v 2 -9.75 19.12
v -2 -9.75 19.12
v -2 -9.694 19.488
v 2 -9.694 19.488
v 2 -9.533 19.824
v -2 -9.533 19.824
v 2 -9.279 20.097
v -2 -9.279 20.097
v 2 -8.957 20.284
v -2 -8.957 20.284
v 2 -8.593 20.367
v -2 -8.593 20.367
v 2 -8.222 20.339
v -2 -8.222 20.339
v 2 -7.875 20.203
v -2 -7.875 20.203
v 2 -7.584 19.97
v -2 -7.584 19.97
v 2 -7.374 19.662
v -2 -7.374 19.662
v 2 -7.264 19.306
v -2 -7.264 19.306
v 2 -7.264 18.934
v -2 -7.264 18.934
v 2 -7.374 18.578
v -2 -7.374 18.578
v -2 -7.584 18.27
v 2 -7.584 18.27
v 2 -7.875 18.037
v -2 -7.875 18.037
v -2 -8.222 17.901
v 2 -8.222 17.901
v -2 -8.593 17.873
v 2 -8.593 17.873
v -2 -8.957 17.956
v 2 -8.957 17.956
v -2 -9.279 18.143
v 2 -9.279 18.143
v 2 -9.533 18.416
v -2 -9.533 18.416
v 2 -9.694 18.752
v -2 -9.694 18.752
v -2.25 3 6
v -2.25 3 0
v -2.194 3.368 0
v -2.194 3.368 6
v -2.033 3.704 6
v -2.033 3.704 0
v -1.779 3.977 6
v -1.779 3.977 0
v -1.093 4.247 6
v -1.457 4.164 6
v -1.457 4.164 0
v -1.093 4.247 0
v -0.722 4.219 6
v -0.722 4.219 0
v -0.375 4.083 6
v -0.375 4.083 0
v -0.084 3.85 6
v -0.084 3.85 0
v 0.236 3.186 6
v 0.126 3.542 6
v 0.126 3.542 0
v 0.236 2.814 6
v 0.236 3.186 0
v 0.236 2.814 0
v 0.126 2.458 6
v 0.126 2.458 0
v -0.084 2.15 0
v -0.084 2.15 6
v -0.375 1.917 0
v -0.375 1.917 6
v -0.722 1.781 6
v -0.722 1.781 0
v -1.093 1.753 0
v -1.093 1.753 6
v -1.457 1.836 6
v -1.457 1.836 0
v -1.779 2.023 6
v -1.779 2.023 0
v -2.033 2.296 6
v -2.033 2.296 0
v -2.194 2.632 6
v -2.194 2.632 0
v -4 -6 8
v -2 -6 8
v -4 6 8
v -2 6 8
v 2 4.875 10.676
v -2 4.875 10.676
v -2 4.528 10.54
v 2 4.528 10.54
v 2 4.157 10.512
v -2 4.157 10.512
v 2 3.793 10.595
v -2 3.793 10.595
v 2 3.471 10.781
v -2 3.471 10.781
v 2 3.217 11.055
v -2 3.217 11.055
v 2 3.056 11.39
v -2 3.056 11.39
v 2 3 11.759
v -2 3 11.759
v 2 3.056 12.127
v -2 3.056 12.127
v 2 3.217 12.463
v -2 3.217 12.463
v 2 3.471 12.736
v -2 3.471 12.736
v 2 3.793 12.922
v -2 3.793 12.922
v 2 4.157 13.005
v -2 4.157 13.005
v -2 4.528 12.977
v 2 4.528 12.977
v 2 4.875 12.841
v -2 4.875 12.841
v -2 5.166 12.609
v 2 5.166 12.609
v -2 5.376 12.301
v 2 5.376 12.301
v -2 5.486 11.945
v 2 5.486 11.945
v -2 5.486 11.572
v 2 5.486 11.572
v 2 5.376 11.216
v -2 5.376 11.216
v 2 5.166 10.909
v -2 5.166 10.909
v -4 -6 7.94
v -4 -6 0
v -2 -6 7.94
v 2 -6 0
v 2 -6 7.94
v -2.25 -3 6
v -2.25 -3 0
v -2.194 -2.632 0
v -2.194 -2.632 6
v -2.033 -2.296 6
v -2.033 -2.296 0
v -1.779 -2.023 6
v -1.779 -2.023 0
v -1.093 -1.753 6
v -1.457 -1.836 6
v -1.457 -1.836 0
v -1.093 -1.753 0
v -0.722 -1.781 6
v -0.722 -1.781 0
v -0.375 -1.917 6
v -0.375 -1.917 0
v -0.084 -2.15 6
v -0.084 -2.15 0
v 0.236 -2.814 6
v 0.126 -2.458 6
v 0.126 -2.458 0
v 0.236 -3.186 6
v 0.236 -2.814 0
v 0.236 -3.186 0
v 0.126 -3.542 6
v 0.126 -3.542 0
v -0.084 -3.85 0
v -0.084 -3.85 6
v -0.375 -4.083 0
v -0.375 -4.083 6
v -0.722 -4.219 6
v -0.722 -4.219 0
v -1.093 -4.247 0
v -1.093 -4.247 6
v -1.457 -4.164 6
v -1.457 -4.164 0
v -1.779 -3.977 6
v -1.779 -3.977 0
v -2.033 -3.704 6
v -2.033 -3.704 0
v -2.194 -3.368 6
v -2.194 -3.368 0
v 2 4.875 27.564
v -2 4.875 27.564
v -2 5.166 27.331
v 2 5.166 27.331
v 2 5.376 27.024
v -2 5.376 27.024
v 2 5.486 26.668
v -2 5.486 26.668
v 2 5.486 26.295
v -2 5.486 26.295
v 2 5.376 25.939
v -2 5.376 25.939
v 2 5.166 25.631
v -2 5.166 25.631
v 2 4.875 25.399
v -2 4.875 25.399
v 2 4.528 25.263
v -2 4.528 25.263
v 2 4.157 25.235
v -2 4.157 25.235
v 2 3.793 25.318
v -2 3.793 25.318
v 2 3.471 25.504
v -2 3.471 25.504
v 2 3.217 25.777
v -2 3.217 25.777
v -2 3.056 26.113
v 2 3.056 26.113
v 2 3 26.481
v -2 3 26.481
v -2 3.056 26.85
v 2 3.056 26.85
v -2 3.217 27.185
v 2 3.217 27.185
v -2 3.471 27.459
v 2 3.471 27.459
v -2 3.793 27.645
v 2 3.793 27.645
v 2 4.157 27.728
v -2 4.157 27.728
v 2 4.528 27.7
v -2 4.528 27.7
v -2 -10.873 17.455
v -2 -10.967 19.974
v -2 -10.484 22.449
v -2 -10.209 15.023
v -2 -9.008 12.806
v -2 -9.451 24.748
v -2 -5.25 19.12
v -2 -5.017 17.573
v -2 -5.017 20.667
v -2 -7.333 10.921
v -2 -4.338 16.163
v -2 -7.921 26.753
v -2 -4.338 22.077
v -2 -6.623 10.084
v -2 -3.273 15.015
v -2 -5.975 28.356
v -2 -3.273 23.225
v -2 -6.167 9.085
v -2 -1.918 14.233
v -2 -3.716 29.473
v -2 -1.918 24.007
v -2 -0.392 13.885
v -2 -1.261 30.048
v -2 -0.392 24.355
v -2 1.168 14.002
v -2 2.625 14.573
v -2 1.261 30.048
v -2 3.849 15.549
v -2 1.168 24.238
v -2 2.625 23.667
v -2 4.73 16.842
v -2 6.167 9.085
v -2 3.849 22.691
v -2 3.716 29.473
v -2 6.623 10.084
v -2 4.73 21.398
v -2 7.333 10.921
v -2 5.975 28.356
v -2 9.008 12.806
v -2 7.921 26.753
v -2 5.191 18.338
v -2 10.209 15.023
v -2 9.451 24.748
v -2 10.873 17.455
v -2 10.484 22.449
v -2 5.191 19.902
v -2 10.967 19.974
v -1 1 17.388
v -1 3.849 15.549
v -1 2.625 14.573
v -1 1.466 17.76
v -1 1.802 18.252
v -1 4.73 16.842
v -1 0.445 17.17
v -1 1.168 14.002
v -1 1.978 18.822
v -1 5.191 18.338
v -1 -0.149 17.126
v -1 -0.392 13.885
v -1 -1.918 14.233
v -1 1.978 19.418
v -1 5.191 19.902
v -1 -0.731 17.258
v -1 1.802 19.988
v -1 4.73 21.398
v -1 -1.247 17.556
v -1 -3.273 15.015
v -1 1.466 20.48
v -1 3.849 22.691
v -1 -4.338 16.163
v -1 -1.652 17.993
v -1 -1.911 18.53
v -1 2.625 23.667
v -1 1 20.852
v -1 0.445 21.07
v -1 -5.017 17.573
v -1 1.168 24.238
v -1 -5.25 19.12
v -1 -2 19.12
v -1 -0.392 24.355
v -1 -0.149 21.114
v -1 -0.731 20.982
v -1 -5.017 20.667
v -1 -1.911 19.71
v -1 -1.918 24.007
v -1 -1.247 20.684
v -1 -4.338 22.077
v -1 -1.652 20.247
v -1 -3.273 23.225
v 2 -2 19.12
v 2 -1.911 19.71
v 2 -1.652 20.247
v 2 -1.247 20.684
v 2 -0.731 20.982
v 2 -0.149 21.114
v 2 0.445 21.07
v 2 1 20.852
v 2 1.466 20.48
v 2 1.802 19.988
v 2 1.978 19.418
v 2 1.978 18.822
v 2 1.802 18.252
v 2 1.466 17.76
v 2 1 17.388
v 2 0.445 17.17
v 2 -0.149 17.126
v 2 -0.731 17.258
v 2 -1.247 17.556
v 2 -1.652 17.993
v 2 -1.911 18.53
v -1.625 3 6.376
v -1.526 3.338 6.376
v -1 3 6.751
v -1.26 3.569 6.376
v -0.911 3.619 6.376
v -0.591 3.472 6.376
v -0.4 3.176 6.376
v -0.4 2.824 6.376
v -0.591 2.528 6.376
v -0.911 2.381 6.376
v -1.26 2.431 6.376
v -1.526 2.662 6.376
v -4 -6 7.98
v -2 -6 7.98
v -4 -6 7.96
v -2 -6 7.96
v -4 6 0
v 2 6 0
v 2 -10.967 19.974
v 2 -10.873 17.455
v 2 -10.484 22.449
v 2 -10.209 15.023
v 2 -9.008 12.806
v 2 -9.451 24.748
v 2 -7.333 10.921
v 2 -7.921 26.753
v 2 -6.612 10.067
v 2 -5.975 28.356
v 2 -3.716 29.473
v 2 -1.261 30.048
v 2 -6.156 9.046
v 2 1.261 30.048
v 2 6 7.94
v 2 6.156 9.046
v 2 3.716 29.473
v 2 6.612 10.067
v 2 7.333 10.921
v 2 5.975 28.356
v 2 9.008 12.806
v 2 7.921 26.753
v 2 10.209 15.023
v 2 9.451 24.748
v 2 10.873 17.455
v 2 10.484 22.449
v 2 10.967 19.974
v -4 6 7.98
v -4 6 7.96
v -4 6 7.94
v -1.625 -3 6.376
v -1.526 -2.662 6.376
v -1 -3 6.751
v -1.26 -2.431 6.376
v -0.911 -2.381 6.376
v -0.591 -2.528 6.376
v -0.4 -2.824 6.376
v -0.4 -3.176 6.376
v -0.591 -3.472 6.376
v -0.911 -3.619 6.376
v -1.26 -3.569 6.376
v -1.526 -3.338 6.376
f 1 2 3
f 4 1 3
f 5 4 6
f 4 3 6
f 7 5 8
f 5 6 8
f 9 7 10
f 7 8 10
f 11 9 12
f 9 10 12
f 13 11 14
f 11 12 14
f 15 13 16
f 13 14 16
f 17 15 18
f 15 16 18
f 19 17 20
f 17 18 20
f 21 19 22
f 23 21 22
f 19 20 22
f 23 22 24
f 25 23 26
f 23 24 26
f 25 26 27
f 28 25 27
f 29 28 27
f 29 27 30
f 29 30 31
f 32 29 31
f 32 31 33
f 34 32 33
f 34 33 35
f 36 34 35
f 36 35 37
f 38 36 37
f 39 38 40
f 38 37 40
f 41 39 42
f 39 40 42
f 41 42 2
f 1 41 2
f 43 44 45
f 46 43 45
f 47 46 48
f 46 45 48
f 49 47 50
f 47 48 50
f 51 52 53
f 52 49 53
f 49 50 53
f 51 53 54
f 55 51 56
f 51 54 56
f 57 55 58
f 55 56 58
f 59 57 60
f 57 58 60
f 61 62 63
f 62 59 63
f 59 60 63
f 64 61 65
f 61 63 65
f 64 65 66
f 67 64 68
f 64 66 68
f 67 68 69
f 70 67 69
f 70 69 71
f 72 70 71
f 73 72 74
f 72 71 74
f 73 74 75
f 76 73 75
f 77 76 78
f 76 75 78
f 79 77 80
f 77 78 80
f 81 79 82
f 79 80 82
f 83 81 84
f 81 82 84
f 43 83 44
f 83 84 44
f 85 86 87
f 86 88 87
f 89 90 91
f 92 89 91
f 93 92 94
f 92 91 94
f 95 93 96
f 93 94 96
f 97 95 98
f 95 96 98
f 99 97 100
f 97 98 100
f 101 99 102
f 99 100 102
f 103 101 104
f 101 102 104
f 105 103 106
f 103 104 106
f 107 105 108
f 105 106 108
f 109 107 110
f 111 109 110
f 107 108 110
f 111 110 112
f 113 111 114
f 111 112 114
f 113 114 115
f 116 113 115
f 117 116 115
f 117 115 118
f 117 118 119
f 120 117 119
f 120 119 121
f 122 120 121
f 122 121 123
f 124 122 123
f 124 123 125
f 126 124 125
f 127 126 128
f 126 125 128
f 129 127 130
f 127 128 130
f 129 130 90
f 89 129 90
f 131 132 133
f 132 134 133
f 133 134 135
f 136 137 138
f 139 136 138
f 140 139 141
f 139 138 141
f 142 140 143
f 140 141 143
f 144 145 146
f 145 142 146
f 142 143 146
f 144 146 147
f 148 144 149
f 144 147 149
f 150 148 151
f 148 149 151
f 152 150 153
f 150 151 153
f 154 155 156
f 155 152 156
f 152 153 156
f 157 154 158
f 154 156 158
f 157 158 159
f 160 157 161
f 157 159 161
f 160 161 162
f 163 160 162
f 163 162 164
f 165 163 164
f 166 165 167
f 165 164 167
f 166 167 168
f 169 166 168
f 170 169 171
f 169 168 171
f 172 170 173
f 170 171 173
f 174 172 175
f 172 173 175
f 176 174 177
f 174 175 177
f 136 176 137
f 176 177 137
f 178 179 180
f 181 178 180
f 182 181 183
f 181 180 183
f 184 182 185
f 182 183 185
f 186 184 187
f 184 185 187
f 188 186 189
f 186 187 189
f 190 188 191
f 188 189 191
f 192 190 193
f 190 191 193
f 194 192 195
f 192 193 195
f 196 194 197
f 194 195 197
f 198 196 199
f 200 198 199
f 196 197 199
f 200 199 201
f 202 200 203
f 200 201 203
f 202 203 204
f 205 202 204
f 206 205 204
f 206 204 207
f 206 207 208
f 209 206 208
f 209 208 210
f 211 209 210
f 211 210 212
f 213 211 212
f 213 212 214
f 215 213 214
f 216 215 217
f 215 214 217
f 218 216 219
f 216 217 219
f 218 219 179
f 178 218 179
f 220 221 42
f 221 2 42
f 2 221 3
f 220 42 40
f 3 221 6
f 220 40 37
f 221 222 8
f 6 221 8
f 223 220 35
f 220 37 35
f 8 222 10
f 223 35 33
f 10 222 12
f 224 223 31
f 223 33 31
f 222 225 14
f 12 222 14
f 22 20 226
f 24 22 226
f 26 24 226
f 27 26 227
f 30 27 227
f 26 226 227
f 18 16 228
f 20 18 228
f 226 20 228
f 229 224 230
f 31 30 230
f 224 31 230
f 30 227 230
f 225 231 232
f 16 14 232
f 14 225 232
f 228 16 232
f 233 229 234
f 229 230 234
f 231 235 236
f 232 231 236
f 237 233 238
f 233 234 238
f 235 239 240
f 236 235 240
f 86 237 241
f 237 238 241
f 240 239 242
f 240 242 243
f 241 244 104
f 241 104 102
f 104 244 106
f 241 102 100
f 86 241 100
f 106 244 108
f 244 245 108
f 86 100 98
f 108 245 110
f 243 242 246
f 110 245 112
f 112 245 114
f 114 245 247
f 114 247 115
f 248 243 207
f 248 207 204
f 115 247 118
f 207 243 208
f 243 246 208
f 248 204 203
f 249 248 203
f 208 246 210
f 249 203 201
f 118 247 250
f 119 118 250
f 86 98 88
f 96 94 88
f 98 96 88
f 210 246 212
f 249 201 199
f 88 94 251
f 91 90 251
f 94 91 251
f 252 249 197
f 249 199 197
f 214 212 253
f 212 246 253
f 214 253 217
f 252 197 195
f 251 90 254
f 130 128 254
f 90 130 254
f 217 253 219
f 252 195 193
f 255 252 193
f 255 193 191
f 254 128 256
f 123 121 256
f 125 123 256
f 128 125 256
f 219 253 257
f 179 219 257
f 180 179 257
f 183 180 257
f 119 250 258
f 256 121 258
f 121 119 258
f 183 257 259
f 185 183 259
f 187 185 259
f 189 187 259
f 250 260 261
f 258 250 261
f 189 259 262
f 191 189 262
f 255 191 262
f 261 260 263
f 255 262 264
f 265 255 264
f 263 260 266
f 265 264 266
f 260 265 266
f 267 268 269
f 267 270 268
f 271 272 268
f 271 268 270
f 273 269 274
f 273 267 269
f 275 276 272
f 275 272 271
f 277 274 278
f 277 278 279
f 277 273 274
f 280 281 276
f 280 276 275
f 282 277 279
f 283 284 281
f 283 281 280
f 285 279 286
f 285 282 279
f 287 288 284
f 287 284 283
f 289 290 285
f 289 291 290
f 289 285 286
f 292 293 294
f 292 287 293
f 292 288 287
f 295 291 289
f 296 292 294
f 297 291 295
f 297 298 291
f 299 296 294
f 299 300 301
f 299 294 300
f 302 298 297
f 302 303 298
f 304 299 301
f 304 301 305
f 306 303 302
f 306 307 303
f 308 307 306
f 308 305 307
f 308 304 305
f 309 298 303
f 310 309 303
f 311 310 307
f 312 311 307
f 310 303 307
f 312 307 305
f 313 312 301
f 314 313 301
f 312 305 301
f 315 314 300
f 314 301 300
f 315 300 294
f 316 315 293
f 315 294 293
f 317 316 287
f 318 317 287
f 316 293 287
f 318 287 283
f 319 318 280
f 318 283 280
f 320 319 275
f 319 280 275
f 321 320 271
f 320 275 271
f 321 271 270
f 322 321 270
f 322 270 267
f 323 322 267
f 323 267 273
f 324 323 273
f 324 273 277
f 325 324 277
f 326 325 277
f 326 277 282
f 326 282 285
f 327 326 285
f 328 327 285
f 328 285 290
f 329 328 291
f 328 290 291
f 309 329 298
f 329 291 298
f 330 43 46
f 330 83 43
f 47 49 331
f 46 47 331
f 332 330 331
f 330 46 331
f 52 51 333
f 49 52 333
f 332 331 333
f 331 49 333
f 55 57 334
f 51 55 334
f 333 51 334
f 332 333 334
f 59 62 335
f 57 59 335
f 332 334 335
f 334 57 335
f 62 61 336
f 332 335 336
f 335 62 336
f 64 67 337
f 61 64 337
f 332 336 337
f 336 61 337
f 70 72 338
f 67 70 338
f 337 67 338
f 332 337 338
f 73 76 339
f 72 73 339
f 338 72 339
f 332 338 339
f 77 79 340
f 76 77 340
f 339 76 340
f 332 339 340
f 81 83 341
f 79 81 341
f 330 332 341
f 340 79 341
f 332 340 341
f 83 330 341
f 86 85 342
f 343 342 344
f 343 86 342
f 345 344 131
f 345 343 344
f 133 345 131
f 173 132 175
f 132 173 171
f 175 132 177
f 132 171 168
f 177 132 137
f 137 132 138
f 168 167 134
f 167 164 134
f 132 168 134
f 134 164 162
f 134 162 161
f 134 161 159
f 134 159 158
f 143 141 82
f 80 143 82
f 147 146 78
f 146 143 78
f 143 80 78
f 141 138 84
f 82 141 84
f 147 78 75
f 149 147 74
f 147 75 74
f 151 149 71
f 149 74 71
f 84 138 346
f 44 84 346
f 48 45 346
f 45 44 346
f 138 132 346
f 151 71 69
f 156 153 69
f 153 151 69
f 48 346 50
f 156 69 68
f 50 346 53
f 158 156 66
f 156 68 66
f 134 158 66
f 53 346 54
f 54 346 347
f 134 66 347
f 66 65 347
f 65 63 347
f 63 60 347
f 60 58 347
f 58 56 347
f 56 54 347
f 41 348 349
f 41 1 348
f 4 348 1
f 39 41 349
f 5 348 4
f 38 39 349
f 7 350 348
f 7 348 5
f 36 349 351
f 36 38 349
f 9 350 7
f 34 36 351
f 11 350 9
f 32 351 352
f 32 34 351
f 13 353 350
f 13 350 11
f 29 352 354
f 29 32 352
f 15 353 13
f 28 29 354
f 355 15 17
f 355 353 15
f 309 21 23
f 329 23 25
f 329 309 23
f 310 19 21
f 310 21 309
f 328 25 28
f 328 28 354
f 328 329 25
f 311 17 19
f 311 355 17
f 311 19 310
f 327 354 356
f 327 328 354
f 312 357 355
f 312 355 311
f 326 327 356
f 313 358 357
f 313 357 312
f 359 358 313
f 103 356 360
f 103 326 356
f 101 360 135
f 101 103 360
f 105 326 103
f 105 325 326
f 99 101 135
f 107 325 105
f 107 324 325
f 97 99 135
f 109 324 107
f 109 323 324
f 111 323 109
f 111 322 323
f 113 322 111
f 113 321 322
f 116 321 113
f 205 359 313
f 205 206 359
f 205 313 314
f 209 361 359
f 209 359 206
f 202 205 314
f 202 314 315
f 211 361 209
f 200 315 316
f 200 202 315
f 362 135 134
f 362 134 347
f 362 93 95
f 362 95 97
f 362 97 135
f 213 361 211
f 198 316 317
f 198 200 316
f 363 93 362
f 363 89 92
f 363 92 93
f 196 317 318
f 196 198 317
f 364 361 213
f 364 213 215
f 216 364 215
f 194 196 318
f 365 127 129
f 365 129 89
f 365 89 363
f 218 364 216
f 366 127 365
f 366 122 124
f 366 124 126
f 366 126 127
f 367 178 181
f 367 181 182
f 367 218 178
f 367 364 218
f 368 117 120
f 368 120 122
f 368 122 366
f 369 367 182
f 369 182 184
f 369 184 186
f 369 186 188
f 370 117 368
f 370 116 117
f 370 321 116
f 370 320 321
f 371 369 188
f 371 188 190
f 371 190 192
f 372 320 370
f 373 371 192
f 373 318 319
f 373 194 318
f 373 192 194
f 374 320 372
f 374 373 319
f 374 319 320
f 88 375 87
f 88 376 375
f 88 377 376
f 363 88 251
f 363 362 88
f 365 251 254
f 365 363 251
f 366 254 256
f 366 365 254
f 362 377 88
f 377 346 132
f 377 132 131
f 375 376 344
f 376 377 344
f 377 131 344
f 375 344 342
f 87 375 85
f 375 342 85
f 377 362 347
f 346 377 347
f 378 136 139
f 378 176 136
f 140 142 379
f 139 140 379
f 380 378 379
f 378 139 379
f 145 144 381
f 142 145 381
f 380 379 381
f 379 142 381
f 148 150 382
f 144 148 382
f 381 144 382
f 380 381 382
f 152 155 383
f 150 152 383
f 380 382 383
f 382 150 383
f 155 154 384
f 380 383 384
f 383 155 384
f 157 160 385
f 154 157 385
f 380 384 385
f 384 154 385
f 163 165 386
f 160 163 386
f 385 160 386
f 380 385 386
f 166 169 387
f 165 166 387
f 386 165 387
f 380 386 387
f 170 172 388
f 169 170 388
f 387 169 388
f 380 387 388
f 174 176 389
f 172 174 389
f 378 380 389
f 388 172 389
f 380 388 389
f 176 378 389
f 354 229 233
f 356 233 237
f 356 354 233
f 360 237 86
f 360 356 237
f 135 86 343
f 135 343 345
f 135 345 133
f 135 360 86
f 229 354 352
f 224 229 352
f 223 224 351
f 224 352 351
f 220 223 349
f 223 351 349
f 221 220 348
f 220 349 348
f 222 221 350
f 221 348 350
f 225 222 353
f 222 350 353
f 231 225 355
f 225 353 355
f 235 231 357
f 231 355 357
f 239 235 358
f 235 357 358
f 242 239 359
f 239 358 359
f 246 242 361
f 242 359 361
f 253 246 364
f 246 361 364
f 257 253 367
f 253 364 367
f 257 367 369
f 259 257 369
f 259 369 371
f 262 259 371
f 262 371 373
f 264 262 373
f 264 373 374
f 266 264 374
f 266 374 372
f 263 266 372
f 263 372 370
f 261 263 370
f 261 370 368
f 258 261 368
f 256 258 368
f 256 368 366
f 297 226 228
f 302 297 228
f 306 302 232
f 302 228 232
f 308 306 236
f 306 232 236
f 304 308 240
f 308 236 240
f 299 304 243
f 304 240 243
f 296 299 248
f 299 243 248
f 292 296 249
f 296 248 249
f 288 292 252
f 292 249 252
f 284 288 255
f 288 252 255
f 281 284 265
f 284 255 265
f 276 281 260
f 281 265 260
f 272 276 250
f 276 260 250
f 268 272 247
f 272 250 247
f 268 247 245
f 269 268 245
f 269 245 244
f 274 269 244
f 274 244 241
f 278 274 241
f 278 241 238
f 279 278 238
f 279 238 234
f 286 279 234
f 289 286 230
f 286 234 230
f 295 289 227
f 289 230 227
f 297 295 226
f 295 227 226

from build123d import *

# Parameters (mm, degrees)
SKETCH1_W             = 6
SKETCH1_H             = 12
EXTRUDE1_DEPTH        = 8
SKETCH3_W             = 4
SKETCH3_H             = 8.6
EXTRUDE2_DEPTH        = 1
SKETCH2_R             = 1.25
EXTRUDE3_DEPTH        = 6
EXTRUDE4_DEPTH        = 4
SKETCH6_R             = 5.25
EXTRUDE5_DEPTH        = 1
SKETCH7_R             = 1.25
EXTRUDE6_DEPTH        = 4
CIRPATTERN1_COUNT     = 3
SKETCH8_R             = 2
EXTRUDE7_DEPTH        = 3
FILLET1_R             = 4
M3_TAPPED_HOLE1_D     = 2.5
M3_TAPPED_HOLE1_DEPTH = 6
M3_TAPPED_HOLE1_TIP   = 0.751075774


with BuildPart() as part:
    # Sketch1 → Extrude1 (new body)
    with BuildSketch(Plane.XY):
        with Locations((-1, 0)):
            Rectangle(SKETCH1_W, SKETCH1_H)
    extrude(amount=EXTRUDE1_DEPTH)

    # Sketch3 → Extrude2 (add)
    with BuildSketch(Plane.XY.offset(8)):
        Rectangle(SKETCH3_W, SKETCH3_H)
    extrude(amount=EXTRUDE2_DEPTH)

    # Sketch2 → Extrude3 (cut)
    with BuildSketch(Plane(origin=(0, 0, 0), x_dir=(-1, 0, 0), z_dir=(0, 0, -1))):
        with Locations((1, 3)):
            Circle(SKETCH2_R)
        with Locations((1, -3)):
            Circle(SKETCH2_R)
    extrude(amount=-EXTRUDE3_DEPTH, mode=Mode.SUBTRACT)

    # Sketch4 → Extrude4 (add)
    with BuildSketch(Plane(origin=(2, 0, 0), x_dir=(0, 0, -1), z_dir=(1, 0, 0))):
        with BuildLine():
            Line((-9.900455543, 6), (-8, 6))
            Line((-8, 6), (-8, -6))
            Line((-8, -6), (-9.900455543, -6))
            ThreePointArc((-9.900455543, -6), (-30.12, 0), (-9.900455543, 6))
        make_face()
    extrude(amount=-EXTRUDE4_DEPTH)

    # Sketch6 → Extrude5 (cut)
    with BuildSketch(Plane.ZY.offset(2)):
        with Locations(Location((19.12, 0, 0), (0, 0, 270))):
            Circle(SKETCH6_R)
    extrude(amount=-EXTRUDE5_DEPTH, mode=Mode.SUBTRACT)

    # Sketch7 → Extrude6 (cut)
    with BuildSketch(Plane.ZY.offset(2)):
        with Locations(Location((19.12, -8.5, 0), (0, 0, 270))):
            Circle(SKETCH7_R)
    extrude6 = extrude(amount=-EXTRUDE6_DEPTH, mode=Mode.SUBTRACT)

    # CirPattern1: Extrude6 ×3 about axis
    cirpattern1_axis = Axis((0, 0, 19.12), (1, 0, 0))
    for i in range(1, CIRPATTERN1_COUNT):
        add(extrude6.rotate(cirpattern1_axis, i * 360 / CIRPATTERN1_COUNT), mode=Mode.SUBTRACT)

    # Sketch8 → Extrude7 (cut)
    with BuildSketch(Plane.ZY.offset(1)):
        with Locations(Location((19.12, 0, 0), (0, 0, 270))):
            Circle(SKETCH8_R)
    extrude(amount=-EXTRUDE7_DEPTH, mode=Mode.SUBTRACT)

    # Fillet1
    # the kernel refuses this fillet: 4 mm, written as the material it adds along each edge
    with BuildSketch(Plane(origin=(2, 6, 9.900455543), x_dir=(0, 0, -1), z_dir=(-1, 0, 0))) as fillet1_piece_1_section:
        with BuildLine():
            CenterArc((1.96079543, -4), FILLET1_R, 90, 48.189685104)
            ThreePointArc((-1.02062854, -1.333333333), (-0.484835824, -0.686169688), (0, 0))
            Line((0, 0), (1.96079543, 0))
        make_face()
    fillet1_piece_1 = extrude(amount=4, mode=Mode.PRIVATE)
    fillet1_piece_1 = split(fillet1_piece_1, bisect_by=Plane(origin=(0, 5.96007597, 8), z_dir=(0, 0, -1)), keep=Keep.TOP, mode=Mode.PRIVATE)
    add(fillet1_piece_1)
    with BuildSketch(Plane(origin=(2, 6, 9.900455543), x_dir=(0, 0, -1), z_dir=(-1, 0, 0))) as fillet1_piece_2_section:
        with BuildLine():
            CenterArc((1.96079543, -4), FILLET1_R, 90, 48.189685104)
            ThreePointArc((-1.02062854, -1.333333333), (-0.484835824, -0.686169688), (0, 0))
            Line((0, 0), (1.96079543, 0))
        make_face()
    fillet1_piece_2 = extrude(amount=4, mode=Mode.PRIVATE)
    fillet1_piece_2 = split(fillet1_piece_2, bisect_by=Plane(origin=(0, 6.284176822, 8), z_dir=(0, 0, 1)), keep=Keep.TOP, mode=Mode.PRIVATE)
    add(fillet1_piece_2)
    with BuildSketch(Plane(origin=(2, 6, 9.900455543), x_dir=(0, 0, -1), z_dir=(-1, 0, 0))) as fillet1_piece_3_section:
        with BuildLine():
            CenterArc((1.96079543, -4), FILLET1_R, 90, 48.189685104)
            ThreePointArc((-1.02062854, -1.333333333), (-0.484835824, -0.686169688), (0, 0))
            Line((0, 0), (1.96079543, 0))
        make_face()
    fillet1_piece_3 = extrude(amount=8.901988576, mode=Mode.PRIVATE)
    fillet1_piece_3 = split(fillet1_piece_3, bisect_by=Plane(origin=(-4, 5.96007597, 7.969858609), z_dir=(1, 0, 0)), keep=Keep.TOP, mode=Mode.PRIVATE)
    fillet1_piece_3 = split(fillet1_piece_3, bisect_by=Plane(origin=(-3, 5.96007597, 8), z_dir=(0, 0, -1)), keep=Keep.TOP, mode=Mode.PRIVATE)
    fillet1_piece_3 = split(fillet1_piece_3, bisect_by=Plane(origin=(-2, 5.96007597, 7.969858609), z_dir=(-1, 0, 0)), keep=Keep.TOP, mode=Mode.PRIVATE)
    add(fillet1_piece_3)
    with BuildSketch(Plane(origin=(2, -6, 9.900455543), x_dir=(0, -0.794064421171895, 0.6078336080120474), z_dir=(-1, 0, 0))) as fillet1_piece_4_section:
        with BuildLine():
            CenterArc((1.984420324, -3.98833232), FILLET1_R, 94.377291872, 48.189685104)
            Line((-1.191837361, -1.556997888), (0, 0))
            ThreePointArc((0, 0), (0.839562445, -0.032086119), (1.679124889, 0))
        make_face()
    fillet1_piece_4 = extrude(amount=4, mode=Mode.PRIVATE)
    fillet1_piece_4 = split(fillet1_piece_4, bisect_by=Plane(origin=(0, -6.284176822, 8), z_dir=(0, 0, 1)), keep=Keep.TOP, mode=Mode.PRIVATE)
    add(fillet1_piece_4)
    with BuildSketch(Plane(origin=(2, -6, 9.900455543), x_dir=(0, -0.794064421171895, 0.6078336080120474), z_dir=(-1, 0, 0))) as fillet1_piece_5_section:
        with BuildLine():
            CenterArc((1.984420324, -3.98833232), FILLET1_R, 94.377291872, 48.189685104)
            Line((-1.191837361, -1.556997888), (0, 0))
            ThreePointArc((0, 0), (0.839562445, -0.032086119), (1.679124889, 0))
        make_face()
    fillet1_piece_5 = extrude(amount=4, mode=Mode.PRIVATE)
    fillet1_piece_5 = split(fillet1_piece_5, bisect_by=Plane(origin=(0, -5.96007597, 8), z_dir=(0, 0, -1)), keep=Keep.TOP, mode=Mode.PRIVATE)
    add(fillet1_piece_5)
    with BuildSketch(Plane(origin=(2, -6, 9.900455543), x_dir=(0, -0.794064421171895, 0.6078336080120474), z_dir=(-1, 0, 0))) as fillet1_piece_6_section:
        with BuildLine():
            CenterArc((1.984420324, -3.98833232), FILLET1_R, 94.377291872, 48.189685104)
            Line((-1.191837361, -1.556997888), (0, 0))
            ThreePointArc((0, 0), (0.839562445, -0.032086119), (1.679124889, 0))
        make_face()
    fillet1_piece_6 = extrude(amount=8.901988576, mode=Mode.PRIVATE)
    fillet1_piece_6 = split(fillet1_piece_6, bisect_by=Plane(origin=(-4, -5.96007597, 7.969858609), z_dir=(1, 0, 0)), keep=Keep.TOP, mode=Mode.PRIVATE)
    fillet1_piece_6 = split(fillet1_piece_6, bisect_by=Plane(origin=(-3, -5.96007597, 8), z_dir=(0, 0, -1)), keep=Keep.TOP, mode=Mode.PRIVATE)
    fillet1_piece_6 = split(fillet1_piece_6, bisect_by=Plane(origin=(-2, -5.96007597, 7.969858609), z_dir=(-1, 0, 0)), keep=Keep.TOP, mode=Mode.PRIVATE)
    add(fillet1_piece_6)

    # M3 Tapped Hole1
    with Locations(Plane(origin=(-1, 3, 0), x_dir=(-1, 0, 0), z_dir=(0, 0, -1))):
        with Locations((0, 0), (0, -6)):
            Hole(M3_TAPPED_HOLE1_D / 2, depth=M3_TAPPED_HOLE1_DEPTH)
            with Locations((0, 0, -(M3_TAPPED_HOLE1_DEPTH + M3_TAPPED_HOLE1_TIP / 2))):  # 118° drill point
                Cone(0, M3_TAPPED_HOLE1_D / 2, M3_TAPPED_HOLE1_TIP, mode=Mode.SUBTRACT)


solid = part.part
